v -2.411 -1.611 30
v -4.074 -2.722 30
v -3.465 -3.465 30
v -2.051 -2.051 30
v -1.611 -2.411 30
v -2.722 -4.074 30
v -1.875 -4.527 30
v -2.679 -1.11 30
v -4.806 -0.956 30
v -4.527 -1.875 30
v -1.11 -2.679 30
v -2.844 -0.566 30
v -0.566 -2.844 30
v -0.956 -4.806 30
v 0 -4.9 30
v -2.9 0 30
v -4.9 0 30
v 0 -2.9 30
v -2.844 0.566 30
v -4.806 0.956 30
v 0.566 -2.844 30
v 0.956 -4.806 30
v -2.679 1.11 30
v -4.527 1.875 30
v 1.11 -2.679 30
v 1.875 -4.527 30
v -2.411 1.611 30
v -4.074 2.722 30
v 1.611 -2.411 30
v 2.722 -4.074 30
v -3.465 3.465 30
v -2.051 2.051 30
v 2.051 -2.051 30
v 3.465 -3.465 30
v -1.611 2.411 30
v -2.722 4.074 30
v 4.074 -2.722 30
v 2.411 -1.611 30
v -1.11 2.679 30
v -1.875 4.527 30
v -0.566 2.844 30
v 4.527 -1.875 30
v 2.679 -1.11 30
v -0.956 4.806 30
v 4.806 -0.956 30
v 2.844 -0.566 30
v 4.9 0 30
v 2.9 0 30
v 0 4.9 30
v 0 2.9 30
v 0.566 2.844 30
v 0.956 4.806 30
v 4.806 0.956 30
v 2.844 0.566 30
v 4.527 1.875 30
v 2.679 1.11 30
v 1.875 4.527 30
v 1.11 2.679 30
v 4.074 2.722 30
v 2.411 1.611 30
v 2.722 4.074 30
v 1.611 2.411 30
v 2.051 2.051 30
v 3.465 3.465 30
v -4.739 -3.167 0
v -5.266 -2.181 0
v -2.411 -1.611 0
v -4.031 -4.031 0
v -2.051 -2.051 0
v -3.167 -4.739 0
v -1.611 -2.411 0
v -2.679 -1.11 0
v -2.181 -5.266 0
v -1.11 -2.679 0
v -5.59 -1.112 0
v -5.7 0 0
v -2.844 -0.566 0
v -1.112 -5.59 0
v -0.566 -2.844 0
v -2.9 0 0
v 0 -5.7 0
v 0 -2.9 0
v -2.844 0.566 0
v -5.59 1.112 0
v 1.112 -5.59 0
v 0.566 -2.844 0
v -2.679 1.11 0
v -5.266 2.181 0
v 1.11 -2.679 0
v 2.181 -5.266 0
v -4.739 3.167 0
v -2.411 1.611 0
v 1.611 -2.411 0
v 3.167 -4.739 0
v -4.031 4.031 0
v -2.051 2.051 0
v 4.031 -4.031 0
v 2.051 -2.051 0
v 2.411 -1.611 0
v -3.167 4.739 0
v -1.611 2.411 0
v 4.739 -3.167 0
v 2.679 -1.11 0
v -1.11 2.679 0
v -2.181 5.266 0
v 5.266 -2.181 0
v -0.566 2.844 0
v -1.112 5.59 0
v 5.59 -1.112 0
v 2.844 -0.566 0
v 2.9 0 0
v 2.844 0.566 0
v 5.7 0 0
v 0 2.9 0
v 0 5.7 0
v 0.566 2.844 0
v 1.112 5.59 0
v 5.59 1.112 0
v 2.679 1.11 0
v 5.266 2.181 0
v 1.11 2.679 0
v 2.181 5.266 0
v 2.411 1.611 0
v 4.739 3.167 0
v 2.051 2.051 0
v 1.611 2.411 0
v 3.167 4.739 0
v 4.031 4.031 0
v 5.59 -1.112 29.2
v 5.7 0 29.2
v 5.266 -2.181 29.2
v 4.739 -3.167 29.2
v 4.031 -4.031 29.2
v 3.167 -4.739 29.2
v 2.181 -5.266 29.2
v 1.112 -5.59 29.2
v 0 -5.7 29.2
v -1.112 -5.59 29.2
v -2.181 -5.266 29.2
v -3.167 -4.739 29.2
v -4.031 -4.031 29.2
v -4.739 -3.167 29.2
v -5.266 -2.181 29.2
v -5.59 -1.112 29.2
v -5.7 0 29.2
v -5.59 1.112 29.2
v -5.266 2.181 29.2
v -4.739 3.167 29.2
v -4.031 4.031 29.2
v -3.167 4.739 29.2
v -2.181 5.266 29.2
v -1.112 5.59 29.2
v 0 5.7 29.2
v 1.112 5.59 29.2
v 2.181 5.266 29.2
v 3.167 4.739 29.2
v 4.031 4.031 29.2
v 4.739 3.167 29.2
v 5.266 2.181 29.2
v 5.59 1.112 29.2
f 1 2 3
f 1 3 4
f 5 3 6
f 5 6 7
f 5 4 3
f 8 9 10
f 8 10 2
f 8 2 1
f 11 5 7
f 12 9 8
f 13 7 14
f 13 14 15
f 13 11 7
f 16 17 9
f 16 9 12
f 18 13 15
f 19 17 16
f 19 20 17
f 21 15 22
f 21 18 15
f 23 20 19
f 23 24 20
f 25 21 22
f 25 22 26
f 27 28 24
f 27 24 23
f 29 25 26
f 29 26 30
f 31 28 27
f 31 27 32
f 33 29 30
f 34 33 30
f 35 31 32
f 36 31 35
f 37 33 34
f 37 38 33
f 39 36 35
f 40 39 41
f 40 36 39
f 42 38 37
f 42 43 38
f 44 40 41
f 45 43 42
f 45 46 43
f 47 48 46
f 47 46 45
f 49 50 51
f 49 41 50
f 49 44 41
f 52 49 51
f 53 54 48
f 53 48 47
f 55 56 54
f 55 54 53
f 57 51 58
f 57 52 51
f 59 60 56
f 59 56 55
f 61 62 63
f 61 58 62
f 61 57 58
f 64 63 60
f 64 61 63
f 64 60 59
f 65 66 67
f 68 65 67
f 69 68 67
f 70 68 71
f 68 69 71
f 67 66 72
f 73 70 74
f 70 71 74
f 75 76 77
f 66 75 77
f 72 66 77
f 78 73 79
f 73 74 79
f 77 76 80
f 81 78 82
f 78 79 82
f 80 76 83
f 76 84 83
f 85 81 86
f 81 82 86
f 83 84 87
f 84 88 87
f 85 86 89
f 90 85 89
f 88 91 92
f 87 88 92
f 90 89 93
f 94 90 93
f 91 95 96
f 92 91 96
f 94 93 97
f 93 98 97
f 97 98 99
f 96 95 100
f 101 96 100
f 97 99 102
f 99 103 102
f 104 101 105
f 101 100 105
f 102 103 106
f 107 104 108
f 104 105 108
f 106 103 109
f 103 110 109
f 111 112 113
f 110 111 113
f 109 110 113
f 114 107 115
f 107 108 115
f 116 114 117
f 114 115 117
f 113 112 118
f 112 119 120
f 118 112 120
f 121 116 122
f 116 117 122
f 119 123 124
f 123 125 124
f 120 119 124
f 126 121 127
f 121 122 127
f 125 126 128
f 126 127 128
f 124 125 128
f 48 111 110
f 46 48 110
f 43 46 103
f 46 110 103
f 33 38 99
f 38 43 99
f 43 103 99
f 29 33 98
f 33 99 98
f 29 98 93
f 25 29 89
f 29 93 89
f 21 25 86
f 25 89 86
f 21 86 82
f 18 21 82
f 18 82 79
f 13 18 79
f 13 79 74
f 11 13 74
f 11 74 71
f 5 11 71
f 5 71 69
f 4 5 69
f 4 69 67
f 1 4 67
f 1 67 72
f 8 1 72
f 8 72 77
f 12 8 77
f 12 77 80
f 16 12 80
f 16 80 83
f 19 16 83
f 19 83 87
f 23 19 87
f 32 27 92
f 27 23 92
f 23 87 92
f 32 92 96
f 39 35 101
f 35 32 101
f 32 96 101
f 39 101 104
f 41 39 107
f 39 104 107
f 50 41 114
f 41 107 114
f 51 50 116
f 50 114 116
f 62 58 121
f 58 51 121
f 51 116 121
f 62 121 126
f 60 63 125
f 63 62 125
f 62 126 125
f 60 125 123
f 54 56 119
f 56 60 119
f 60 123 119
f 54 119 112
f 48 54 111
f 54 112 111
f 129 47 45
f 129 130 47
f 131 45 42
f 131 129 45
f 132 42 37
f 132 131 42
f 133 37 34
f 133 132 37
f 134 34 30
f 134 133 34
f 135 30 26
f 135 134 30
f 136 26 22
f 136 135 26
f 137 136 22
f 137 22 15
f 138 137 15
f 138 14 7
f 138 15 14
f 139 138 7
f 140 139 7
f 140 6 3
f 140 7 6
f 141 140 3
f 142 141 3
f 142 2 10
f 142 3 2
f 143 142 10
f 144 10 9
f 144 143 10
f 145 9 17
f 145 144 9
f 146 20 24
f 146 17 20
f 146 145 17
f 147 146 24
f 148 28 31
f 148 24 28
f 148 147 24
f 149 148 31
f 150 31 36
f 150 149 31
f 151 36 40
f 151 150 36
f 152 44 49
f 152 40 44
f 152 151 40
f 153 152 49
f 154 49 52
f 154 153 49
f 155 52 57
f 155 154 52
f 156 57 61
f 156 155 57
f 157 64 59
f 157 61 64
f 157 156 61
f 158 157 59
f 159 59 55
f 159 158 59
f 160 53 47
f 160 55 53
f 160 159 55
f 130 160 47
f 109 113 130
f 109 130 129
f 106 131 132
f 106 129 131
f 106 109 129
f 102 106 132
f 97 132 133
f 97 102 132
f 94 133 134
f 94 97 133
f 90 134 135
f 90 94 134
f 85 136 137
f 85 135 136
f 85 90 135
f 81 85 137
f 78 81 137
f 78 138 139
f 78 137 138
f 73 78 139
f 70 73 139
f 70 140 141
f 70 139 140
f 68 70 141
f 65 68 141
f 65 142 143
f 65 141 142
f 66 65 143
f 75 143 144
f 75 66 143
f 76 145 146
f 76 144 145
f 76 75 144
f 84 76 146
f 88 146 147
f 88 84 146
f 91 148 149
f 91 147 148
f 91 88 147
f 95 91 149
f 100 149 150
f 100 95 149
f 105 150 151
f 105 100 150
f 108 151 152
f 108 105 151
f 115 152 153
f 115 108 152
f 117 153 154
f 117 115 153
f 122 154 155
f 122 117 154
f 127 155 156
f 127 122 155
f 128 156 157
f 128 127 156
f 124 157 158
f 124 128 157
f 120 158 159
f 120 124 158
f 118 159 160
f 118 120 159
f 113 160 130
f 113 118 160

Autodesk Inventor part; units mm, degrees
ref_plane "YZ Plane" through (0, 0, 0) normal (1, 0, 0) x (0, 1, 0)
ref_plane "XZ Plane" through (0, 0, 0) normal (0, 1, 0) x (-1, 0, 0)
ref_plane "XY Plane" through (0, 0, 0) normal (0, 0, 1) x (1, 0, 0)
sketch "Sketch1" plane through (0, 0, 0) normal (0, 0, 1) x (1, 0, 0)
  circle A0 centre (0, 0) radius 5.7
  dimension "d0" = 11.4
extrude "Extrusion1" add sketch "Sketch1" along normal blind 30
chamfer "Chamfer1" distance 0.8 angle 45 1 edges at (-5.7, 0, 30)
sketch "Sketch2" plane through (0, 0, 0) normal (0, 0, 1) x (1, 0, 0)
  circle A0 centre (0, 0) radius 2.9
  dimension "d6" = 5.8
extrude "Extrusion2" cut sketch "Sketch2" along normal up to surface (30 mm away)
properties part number "Insert30mm"
